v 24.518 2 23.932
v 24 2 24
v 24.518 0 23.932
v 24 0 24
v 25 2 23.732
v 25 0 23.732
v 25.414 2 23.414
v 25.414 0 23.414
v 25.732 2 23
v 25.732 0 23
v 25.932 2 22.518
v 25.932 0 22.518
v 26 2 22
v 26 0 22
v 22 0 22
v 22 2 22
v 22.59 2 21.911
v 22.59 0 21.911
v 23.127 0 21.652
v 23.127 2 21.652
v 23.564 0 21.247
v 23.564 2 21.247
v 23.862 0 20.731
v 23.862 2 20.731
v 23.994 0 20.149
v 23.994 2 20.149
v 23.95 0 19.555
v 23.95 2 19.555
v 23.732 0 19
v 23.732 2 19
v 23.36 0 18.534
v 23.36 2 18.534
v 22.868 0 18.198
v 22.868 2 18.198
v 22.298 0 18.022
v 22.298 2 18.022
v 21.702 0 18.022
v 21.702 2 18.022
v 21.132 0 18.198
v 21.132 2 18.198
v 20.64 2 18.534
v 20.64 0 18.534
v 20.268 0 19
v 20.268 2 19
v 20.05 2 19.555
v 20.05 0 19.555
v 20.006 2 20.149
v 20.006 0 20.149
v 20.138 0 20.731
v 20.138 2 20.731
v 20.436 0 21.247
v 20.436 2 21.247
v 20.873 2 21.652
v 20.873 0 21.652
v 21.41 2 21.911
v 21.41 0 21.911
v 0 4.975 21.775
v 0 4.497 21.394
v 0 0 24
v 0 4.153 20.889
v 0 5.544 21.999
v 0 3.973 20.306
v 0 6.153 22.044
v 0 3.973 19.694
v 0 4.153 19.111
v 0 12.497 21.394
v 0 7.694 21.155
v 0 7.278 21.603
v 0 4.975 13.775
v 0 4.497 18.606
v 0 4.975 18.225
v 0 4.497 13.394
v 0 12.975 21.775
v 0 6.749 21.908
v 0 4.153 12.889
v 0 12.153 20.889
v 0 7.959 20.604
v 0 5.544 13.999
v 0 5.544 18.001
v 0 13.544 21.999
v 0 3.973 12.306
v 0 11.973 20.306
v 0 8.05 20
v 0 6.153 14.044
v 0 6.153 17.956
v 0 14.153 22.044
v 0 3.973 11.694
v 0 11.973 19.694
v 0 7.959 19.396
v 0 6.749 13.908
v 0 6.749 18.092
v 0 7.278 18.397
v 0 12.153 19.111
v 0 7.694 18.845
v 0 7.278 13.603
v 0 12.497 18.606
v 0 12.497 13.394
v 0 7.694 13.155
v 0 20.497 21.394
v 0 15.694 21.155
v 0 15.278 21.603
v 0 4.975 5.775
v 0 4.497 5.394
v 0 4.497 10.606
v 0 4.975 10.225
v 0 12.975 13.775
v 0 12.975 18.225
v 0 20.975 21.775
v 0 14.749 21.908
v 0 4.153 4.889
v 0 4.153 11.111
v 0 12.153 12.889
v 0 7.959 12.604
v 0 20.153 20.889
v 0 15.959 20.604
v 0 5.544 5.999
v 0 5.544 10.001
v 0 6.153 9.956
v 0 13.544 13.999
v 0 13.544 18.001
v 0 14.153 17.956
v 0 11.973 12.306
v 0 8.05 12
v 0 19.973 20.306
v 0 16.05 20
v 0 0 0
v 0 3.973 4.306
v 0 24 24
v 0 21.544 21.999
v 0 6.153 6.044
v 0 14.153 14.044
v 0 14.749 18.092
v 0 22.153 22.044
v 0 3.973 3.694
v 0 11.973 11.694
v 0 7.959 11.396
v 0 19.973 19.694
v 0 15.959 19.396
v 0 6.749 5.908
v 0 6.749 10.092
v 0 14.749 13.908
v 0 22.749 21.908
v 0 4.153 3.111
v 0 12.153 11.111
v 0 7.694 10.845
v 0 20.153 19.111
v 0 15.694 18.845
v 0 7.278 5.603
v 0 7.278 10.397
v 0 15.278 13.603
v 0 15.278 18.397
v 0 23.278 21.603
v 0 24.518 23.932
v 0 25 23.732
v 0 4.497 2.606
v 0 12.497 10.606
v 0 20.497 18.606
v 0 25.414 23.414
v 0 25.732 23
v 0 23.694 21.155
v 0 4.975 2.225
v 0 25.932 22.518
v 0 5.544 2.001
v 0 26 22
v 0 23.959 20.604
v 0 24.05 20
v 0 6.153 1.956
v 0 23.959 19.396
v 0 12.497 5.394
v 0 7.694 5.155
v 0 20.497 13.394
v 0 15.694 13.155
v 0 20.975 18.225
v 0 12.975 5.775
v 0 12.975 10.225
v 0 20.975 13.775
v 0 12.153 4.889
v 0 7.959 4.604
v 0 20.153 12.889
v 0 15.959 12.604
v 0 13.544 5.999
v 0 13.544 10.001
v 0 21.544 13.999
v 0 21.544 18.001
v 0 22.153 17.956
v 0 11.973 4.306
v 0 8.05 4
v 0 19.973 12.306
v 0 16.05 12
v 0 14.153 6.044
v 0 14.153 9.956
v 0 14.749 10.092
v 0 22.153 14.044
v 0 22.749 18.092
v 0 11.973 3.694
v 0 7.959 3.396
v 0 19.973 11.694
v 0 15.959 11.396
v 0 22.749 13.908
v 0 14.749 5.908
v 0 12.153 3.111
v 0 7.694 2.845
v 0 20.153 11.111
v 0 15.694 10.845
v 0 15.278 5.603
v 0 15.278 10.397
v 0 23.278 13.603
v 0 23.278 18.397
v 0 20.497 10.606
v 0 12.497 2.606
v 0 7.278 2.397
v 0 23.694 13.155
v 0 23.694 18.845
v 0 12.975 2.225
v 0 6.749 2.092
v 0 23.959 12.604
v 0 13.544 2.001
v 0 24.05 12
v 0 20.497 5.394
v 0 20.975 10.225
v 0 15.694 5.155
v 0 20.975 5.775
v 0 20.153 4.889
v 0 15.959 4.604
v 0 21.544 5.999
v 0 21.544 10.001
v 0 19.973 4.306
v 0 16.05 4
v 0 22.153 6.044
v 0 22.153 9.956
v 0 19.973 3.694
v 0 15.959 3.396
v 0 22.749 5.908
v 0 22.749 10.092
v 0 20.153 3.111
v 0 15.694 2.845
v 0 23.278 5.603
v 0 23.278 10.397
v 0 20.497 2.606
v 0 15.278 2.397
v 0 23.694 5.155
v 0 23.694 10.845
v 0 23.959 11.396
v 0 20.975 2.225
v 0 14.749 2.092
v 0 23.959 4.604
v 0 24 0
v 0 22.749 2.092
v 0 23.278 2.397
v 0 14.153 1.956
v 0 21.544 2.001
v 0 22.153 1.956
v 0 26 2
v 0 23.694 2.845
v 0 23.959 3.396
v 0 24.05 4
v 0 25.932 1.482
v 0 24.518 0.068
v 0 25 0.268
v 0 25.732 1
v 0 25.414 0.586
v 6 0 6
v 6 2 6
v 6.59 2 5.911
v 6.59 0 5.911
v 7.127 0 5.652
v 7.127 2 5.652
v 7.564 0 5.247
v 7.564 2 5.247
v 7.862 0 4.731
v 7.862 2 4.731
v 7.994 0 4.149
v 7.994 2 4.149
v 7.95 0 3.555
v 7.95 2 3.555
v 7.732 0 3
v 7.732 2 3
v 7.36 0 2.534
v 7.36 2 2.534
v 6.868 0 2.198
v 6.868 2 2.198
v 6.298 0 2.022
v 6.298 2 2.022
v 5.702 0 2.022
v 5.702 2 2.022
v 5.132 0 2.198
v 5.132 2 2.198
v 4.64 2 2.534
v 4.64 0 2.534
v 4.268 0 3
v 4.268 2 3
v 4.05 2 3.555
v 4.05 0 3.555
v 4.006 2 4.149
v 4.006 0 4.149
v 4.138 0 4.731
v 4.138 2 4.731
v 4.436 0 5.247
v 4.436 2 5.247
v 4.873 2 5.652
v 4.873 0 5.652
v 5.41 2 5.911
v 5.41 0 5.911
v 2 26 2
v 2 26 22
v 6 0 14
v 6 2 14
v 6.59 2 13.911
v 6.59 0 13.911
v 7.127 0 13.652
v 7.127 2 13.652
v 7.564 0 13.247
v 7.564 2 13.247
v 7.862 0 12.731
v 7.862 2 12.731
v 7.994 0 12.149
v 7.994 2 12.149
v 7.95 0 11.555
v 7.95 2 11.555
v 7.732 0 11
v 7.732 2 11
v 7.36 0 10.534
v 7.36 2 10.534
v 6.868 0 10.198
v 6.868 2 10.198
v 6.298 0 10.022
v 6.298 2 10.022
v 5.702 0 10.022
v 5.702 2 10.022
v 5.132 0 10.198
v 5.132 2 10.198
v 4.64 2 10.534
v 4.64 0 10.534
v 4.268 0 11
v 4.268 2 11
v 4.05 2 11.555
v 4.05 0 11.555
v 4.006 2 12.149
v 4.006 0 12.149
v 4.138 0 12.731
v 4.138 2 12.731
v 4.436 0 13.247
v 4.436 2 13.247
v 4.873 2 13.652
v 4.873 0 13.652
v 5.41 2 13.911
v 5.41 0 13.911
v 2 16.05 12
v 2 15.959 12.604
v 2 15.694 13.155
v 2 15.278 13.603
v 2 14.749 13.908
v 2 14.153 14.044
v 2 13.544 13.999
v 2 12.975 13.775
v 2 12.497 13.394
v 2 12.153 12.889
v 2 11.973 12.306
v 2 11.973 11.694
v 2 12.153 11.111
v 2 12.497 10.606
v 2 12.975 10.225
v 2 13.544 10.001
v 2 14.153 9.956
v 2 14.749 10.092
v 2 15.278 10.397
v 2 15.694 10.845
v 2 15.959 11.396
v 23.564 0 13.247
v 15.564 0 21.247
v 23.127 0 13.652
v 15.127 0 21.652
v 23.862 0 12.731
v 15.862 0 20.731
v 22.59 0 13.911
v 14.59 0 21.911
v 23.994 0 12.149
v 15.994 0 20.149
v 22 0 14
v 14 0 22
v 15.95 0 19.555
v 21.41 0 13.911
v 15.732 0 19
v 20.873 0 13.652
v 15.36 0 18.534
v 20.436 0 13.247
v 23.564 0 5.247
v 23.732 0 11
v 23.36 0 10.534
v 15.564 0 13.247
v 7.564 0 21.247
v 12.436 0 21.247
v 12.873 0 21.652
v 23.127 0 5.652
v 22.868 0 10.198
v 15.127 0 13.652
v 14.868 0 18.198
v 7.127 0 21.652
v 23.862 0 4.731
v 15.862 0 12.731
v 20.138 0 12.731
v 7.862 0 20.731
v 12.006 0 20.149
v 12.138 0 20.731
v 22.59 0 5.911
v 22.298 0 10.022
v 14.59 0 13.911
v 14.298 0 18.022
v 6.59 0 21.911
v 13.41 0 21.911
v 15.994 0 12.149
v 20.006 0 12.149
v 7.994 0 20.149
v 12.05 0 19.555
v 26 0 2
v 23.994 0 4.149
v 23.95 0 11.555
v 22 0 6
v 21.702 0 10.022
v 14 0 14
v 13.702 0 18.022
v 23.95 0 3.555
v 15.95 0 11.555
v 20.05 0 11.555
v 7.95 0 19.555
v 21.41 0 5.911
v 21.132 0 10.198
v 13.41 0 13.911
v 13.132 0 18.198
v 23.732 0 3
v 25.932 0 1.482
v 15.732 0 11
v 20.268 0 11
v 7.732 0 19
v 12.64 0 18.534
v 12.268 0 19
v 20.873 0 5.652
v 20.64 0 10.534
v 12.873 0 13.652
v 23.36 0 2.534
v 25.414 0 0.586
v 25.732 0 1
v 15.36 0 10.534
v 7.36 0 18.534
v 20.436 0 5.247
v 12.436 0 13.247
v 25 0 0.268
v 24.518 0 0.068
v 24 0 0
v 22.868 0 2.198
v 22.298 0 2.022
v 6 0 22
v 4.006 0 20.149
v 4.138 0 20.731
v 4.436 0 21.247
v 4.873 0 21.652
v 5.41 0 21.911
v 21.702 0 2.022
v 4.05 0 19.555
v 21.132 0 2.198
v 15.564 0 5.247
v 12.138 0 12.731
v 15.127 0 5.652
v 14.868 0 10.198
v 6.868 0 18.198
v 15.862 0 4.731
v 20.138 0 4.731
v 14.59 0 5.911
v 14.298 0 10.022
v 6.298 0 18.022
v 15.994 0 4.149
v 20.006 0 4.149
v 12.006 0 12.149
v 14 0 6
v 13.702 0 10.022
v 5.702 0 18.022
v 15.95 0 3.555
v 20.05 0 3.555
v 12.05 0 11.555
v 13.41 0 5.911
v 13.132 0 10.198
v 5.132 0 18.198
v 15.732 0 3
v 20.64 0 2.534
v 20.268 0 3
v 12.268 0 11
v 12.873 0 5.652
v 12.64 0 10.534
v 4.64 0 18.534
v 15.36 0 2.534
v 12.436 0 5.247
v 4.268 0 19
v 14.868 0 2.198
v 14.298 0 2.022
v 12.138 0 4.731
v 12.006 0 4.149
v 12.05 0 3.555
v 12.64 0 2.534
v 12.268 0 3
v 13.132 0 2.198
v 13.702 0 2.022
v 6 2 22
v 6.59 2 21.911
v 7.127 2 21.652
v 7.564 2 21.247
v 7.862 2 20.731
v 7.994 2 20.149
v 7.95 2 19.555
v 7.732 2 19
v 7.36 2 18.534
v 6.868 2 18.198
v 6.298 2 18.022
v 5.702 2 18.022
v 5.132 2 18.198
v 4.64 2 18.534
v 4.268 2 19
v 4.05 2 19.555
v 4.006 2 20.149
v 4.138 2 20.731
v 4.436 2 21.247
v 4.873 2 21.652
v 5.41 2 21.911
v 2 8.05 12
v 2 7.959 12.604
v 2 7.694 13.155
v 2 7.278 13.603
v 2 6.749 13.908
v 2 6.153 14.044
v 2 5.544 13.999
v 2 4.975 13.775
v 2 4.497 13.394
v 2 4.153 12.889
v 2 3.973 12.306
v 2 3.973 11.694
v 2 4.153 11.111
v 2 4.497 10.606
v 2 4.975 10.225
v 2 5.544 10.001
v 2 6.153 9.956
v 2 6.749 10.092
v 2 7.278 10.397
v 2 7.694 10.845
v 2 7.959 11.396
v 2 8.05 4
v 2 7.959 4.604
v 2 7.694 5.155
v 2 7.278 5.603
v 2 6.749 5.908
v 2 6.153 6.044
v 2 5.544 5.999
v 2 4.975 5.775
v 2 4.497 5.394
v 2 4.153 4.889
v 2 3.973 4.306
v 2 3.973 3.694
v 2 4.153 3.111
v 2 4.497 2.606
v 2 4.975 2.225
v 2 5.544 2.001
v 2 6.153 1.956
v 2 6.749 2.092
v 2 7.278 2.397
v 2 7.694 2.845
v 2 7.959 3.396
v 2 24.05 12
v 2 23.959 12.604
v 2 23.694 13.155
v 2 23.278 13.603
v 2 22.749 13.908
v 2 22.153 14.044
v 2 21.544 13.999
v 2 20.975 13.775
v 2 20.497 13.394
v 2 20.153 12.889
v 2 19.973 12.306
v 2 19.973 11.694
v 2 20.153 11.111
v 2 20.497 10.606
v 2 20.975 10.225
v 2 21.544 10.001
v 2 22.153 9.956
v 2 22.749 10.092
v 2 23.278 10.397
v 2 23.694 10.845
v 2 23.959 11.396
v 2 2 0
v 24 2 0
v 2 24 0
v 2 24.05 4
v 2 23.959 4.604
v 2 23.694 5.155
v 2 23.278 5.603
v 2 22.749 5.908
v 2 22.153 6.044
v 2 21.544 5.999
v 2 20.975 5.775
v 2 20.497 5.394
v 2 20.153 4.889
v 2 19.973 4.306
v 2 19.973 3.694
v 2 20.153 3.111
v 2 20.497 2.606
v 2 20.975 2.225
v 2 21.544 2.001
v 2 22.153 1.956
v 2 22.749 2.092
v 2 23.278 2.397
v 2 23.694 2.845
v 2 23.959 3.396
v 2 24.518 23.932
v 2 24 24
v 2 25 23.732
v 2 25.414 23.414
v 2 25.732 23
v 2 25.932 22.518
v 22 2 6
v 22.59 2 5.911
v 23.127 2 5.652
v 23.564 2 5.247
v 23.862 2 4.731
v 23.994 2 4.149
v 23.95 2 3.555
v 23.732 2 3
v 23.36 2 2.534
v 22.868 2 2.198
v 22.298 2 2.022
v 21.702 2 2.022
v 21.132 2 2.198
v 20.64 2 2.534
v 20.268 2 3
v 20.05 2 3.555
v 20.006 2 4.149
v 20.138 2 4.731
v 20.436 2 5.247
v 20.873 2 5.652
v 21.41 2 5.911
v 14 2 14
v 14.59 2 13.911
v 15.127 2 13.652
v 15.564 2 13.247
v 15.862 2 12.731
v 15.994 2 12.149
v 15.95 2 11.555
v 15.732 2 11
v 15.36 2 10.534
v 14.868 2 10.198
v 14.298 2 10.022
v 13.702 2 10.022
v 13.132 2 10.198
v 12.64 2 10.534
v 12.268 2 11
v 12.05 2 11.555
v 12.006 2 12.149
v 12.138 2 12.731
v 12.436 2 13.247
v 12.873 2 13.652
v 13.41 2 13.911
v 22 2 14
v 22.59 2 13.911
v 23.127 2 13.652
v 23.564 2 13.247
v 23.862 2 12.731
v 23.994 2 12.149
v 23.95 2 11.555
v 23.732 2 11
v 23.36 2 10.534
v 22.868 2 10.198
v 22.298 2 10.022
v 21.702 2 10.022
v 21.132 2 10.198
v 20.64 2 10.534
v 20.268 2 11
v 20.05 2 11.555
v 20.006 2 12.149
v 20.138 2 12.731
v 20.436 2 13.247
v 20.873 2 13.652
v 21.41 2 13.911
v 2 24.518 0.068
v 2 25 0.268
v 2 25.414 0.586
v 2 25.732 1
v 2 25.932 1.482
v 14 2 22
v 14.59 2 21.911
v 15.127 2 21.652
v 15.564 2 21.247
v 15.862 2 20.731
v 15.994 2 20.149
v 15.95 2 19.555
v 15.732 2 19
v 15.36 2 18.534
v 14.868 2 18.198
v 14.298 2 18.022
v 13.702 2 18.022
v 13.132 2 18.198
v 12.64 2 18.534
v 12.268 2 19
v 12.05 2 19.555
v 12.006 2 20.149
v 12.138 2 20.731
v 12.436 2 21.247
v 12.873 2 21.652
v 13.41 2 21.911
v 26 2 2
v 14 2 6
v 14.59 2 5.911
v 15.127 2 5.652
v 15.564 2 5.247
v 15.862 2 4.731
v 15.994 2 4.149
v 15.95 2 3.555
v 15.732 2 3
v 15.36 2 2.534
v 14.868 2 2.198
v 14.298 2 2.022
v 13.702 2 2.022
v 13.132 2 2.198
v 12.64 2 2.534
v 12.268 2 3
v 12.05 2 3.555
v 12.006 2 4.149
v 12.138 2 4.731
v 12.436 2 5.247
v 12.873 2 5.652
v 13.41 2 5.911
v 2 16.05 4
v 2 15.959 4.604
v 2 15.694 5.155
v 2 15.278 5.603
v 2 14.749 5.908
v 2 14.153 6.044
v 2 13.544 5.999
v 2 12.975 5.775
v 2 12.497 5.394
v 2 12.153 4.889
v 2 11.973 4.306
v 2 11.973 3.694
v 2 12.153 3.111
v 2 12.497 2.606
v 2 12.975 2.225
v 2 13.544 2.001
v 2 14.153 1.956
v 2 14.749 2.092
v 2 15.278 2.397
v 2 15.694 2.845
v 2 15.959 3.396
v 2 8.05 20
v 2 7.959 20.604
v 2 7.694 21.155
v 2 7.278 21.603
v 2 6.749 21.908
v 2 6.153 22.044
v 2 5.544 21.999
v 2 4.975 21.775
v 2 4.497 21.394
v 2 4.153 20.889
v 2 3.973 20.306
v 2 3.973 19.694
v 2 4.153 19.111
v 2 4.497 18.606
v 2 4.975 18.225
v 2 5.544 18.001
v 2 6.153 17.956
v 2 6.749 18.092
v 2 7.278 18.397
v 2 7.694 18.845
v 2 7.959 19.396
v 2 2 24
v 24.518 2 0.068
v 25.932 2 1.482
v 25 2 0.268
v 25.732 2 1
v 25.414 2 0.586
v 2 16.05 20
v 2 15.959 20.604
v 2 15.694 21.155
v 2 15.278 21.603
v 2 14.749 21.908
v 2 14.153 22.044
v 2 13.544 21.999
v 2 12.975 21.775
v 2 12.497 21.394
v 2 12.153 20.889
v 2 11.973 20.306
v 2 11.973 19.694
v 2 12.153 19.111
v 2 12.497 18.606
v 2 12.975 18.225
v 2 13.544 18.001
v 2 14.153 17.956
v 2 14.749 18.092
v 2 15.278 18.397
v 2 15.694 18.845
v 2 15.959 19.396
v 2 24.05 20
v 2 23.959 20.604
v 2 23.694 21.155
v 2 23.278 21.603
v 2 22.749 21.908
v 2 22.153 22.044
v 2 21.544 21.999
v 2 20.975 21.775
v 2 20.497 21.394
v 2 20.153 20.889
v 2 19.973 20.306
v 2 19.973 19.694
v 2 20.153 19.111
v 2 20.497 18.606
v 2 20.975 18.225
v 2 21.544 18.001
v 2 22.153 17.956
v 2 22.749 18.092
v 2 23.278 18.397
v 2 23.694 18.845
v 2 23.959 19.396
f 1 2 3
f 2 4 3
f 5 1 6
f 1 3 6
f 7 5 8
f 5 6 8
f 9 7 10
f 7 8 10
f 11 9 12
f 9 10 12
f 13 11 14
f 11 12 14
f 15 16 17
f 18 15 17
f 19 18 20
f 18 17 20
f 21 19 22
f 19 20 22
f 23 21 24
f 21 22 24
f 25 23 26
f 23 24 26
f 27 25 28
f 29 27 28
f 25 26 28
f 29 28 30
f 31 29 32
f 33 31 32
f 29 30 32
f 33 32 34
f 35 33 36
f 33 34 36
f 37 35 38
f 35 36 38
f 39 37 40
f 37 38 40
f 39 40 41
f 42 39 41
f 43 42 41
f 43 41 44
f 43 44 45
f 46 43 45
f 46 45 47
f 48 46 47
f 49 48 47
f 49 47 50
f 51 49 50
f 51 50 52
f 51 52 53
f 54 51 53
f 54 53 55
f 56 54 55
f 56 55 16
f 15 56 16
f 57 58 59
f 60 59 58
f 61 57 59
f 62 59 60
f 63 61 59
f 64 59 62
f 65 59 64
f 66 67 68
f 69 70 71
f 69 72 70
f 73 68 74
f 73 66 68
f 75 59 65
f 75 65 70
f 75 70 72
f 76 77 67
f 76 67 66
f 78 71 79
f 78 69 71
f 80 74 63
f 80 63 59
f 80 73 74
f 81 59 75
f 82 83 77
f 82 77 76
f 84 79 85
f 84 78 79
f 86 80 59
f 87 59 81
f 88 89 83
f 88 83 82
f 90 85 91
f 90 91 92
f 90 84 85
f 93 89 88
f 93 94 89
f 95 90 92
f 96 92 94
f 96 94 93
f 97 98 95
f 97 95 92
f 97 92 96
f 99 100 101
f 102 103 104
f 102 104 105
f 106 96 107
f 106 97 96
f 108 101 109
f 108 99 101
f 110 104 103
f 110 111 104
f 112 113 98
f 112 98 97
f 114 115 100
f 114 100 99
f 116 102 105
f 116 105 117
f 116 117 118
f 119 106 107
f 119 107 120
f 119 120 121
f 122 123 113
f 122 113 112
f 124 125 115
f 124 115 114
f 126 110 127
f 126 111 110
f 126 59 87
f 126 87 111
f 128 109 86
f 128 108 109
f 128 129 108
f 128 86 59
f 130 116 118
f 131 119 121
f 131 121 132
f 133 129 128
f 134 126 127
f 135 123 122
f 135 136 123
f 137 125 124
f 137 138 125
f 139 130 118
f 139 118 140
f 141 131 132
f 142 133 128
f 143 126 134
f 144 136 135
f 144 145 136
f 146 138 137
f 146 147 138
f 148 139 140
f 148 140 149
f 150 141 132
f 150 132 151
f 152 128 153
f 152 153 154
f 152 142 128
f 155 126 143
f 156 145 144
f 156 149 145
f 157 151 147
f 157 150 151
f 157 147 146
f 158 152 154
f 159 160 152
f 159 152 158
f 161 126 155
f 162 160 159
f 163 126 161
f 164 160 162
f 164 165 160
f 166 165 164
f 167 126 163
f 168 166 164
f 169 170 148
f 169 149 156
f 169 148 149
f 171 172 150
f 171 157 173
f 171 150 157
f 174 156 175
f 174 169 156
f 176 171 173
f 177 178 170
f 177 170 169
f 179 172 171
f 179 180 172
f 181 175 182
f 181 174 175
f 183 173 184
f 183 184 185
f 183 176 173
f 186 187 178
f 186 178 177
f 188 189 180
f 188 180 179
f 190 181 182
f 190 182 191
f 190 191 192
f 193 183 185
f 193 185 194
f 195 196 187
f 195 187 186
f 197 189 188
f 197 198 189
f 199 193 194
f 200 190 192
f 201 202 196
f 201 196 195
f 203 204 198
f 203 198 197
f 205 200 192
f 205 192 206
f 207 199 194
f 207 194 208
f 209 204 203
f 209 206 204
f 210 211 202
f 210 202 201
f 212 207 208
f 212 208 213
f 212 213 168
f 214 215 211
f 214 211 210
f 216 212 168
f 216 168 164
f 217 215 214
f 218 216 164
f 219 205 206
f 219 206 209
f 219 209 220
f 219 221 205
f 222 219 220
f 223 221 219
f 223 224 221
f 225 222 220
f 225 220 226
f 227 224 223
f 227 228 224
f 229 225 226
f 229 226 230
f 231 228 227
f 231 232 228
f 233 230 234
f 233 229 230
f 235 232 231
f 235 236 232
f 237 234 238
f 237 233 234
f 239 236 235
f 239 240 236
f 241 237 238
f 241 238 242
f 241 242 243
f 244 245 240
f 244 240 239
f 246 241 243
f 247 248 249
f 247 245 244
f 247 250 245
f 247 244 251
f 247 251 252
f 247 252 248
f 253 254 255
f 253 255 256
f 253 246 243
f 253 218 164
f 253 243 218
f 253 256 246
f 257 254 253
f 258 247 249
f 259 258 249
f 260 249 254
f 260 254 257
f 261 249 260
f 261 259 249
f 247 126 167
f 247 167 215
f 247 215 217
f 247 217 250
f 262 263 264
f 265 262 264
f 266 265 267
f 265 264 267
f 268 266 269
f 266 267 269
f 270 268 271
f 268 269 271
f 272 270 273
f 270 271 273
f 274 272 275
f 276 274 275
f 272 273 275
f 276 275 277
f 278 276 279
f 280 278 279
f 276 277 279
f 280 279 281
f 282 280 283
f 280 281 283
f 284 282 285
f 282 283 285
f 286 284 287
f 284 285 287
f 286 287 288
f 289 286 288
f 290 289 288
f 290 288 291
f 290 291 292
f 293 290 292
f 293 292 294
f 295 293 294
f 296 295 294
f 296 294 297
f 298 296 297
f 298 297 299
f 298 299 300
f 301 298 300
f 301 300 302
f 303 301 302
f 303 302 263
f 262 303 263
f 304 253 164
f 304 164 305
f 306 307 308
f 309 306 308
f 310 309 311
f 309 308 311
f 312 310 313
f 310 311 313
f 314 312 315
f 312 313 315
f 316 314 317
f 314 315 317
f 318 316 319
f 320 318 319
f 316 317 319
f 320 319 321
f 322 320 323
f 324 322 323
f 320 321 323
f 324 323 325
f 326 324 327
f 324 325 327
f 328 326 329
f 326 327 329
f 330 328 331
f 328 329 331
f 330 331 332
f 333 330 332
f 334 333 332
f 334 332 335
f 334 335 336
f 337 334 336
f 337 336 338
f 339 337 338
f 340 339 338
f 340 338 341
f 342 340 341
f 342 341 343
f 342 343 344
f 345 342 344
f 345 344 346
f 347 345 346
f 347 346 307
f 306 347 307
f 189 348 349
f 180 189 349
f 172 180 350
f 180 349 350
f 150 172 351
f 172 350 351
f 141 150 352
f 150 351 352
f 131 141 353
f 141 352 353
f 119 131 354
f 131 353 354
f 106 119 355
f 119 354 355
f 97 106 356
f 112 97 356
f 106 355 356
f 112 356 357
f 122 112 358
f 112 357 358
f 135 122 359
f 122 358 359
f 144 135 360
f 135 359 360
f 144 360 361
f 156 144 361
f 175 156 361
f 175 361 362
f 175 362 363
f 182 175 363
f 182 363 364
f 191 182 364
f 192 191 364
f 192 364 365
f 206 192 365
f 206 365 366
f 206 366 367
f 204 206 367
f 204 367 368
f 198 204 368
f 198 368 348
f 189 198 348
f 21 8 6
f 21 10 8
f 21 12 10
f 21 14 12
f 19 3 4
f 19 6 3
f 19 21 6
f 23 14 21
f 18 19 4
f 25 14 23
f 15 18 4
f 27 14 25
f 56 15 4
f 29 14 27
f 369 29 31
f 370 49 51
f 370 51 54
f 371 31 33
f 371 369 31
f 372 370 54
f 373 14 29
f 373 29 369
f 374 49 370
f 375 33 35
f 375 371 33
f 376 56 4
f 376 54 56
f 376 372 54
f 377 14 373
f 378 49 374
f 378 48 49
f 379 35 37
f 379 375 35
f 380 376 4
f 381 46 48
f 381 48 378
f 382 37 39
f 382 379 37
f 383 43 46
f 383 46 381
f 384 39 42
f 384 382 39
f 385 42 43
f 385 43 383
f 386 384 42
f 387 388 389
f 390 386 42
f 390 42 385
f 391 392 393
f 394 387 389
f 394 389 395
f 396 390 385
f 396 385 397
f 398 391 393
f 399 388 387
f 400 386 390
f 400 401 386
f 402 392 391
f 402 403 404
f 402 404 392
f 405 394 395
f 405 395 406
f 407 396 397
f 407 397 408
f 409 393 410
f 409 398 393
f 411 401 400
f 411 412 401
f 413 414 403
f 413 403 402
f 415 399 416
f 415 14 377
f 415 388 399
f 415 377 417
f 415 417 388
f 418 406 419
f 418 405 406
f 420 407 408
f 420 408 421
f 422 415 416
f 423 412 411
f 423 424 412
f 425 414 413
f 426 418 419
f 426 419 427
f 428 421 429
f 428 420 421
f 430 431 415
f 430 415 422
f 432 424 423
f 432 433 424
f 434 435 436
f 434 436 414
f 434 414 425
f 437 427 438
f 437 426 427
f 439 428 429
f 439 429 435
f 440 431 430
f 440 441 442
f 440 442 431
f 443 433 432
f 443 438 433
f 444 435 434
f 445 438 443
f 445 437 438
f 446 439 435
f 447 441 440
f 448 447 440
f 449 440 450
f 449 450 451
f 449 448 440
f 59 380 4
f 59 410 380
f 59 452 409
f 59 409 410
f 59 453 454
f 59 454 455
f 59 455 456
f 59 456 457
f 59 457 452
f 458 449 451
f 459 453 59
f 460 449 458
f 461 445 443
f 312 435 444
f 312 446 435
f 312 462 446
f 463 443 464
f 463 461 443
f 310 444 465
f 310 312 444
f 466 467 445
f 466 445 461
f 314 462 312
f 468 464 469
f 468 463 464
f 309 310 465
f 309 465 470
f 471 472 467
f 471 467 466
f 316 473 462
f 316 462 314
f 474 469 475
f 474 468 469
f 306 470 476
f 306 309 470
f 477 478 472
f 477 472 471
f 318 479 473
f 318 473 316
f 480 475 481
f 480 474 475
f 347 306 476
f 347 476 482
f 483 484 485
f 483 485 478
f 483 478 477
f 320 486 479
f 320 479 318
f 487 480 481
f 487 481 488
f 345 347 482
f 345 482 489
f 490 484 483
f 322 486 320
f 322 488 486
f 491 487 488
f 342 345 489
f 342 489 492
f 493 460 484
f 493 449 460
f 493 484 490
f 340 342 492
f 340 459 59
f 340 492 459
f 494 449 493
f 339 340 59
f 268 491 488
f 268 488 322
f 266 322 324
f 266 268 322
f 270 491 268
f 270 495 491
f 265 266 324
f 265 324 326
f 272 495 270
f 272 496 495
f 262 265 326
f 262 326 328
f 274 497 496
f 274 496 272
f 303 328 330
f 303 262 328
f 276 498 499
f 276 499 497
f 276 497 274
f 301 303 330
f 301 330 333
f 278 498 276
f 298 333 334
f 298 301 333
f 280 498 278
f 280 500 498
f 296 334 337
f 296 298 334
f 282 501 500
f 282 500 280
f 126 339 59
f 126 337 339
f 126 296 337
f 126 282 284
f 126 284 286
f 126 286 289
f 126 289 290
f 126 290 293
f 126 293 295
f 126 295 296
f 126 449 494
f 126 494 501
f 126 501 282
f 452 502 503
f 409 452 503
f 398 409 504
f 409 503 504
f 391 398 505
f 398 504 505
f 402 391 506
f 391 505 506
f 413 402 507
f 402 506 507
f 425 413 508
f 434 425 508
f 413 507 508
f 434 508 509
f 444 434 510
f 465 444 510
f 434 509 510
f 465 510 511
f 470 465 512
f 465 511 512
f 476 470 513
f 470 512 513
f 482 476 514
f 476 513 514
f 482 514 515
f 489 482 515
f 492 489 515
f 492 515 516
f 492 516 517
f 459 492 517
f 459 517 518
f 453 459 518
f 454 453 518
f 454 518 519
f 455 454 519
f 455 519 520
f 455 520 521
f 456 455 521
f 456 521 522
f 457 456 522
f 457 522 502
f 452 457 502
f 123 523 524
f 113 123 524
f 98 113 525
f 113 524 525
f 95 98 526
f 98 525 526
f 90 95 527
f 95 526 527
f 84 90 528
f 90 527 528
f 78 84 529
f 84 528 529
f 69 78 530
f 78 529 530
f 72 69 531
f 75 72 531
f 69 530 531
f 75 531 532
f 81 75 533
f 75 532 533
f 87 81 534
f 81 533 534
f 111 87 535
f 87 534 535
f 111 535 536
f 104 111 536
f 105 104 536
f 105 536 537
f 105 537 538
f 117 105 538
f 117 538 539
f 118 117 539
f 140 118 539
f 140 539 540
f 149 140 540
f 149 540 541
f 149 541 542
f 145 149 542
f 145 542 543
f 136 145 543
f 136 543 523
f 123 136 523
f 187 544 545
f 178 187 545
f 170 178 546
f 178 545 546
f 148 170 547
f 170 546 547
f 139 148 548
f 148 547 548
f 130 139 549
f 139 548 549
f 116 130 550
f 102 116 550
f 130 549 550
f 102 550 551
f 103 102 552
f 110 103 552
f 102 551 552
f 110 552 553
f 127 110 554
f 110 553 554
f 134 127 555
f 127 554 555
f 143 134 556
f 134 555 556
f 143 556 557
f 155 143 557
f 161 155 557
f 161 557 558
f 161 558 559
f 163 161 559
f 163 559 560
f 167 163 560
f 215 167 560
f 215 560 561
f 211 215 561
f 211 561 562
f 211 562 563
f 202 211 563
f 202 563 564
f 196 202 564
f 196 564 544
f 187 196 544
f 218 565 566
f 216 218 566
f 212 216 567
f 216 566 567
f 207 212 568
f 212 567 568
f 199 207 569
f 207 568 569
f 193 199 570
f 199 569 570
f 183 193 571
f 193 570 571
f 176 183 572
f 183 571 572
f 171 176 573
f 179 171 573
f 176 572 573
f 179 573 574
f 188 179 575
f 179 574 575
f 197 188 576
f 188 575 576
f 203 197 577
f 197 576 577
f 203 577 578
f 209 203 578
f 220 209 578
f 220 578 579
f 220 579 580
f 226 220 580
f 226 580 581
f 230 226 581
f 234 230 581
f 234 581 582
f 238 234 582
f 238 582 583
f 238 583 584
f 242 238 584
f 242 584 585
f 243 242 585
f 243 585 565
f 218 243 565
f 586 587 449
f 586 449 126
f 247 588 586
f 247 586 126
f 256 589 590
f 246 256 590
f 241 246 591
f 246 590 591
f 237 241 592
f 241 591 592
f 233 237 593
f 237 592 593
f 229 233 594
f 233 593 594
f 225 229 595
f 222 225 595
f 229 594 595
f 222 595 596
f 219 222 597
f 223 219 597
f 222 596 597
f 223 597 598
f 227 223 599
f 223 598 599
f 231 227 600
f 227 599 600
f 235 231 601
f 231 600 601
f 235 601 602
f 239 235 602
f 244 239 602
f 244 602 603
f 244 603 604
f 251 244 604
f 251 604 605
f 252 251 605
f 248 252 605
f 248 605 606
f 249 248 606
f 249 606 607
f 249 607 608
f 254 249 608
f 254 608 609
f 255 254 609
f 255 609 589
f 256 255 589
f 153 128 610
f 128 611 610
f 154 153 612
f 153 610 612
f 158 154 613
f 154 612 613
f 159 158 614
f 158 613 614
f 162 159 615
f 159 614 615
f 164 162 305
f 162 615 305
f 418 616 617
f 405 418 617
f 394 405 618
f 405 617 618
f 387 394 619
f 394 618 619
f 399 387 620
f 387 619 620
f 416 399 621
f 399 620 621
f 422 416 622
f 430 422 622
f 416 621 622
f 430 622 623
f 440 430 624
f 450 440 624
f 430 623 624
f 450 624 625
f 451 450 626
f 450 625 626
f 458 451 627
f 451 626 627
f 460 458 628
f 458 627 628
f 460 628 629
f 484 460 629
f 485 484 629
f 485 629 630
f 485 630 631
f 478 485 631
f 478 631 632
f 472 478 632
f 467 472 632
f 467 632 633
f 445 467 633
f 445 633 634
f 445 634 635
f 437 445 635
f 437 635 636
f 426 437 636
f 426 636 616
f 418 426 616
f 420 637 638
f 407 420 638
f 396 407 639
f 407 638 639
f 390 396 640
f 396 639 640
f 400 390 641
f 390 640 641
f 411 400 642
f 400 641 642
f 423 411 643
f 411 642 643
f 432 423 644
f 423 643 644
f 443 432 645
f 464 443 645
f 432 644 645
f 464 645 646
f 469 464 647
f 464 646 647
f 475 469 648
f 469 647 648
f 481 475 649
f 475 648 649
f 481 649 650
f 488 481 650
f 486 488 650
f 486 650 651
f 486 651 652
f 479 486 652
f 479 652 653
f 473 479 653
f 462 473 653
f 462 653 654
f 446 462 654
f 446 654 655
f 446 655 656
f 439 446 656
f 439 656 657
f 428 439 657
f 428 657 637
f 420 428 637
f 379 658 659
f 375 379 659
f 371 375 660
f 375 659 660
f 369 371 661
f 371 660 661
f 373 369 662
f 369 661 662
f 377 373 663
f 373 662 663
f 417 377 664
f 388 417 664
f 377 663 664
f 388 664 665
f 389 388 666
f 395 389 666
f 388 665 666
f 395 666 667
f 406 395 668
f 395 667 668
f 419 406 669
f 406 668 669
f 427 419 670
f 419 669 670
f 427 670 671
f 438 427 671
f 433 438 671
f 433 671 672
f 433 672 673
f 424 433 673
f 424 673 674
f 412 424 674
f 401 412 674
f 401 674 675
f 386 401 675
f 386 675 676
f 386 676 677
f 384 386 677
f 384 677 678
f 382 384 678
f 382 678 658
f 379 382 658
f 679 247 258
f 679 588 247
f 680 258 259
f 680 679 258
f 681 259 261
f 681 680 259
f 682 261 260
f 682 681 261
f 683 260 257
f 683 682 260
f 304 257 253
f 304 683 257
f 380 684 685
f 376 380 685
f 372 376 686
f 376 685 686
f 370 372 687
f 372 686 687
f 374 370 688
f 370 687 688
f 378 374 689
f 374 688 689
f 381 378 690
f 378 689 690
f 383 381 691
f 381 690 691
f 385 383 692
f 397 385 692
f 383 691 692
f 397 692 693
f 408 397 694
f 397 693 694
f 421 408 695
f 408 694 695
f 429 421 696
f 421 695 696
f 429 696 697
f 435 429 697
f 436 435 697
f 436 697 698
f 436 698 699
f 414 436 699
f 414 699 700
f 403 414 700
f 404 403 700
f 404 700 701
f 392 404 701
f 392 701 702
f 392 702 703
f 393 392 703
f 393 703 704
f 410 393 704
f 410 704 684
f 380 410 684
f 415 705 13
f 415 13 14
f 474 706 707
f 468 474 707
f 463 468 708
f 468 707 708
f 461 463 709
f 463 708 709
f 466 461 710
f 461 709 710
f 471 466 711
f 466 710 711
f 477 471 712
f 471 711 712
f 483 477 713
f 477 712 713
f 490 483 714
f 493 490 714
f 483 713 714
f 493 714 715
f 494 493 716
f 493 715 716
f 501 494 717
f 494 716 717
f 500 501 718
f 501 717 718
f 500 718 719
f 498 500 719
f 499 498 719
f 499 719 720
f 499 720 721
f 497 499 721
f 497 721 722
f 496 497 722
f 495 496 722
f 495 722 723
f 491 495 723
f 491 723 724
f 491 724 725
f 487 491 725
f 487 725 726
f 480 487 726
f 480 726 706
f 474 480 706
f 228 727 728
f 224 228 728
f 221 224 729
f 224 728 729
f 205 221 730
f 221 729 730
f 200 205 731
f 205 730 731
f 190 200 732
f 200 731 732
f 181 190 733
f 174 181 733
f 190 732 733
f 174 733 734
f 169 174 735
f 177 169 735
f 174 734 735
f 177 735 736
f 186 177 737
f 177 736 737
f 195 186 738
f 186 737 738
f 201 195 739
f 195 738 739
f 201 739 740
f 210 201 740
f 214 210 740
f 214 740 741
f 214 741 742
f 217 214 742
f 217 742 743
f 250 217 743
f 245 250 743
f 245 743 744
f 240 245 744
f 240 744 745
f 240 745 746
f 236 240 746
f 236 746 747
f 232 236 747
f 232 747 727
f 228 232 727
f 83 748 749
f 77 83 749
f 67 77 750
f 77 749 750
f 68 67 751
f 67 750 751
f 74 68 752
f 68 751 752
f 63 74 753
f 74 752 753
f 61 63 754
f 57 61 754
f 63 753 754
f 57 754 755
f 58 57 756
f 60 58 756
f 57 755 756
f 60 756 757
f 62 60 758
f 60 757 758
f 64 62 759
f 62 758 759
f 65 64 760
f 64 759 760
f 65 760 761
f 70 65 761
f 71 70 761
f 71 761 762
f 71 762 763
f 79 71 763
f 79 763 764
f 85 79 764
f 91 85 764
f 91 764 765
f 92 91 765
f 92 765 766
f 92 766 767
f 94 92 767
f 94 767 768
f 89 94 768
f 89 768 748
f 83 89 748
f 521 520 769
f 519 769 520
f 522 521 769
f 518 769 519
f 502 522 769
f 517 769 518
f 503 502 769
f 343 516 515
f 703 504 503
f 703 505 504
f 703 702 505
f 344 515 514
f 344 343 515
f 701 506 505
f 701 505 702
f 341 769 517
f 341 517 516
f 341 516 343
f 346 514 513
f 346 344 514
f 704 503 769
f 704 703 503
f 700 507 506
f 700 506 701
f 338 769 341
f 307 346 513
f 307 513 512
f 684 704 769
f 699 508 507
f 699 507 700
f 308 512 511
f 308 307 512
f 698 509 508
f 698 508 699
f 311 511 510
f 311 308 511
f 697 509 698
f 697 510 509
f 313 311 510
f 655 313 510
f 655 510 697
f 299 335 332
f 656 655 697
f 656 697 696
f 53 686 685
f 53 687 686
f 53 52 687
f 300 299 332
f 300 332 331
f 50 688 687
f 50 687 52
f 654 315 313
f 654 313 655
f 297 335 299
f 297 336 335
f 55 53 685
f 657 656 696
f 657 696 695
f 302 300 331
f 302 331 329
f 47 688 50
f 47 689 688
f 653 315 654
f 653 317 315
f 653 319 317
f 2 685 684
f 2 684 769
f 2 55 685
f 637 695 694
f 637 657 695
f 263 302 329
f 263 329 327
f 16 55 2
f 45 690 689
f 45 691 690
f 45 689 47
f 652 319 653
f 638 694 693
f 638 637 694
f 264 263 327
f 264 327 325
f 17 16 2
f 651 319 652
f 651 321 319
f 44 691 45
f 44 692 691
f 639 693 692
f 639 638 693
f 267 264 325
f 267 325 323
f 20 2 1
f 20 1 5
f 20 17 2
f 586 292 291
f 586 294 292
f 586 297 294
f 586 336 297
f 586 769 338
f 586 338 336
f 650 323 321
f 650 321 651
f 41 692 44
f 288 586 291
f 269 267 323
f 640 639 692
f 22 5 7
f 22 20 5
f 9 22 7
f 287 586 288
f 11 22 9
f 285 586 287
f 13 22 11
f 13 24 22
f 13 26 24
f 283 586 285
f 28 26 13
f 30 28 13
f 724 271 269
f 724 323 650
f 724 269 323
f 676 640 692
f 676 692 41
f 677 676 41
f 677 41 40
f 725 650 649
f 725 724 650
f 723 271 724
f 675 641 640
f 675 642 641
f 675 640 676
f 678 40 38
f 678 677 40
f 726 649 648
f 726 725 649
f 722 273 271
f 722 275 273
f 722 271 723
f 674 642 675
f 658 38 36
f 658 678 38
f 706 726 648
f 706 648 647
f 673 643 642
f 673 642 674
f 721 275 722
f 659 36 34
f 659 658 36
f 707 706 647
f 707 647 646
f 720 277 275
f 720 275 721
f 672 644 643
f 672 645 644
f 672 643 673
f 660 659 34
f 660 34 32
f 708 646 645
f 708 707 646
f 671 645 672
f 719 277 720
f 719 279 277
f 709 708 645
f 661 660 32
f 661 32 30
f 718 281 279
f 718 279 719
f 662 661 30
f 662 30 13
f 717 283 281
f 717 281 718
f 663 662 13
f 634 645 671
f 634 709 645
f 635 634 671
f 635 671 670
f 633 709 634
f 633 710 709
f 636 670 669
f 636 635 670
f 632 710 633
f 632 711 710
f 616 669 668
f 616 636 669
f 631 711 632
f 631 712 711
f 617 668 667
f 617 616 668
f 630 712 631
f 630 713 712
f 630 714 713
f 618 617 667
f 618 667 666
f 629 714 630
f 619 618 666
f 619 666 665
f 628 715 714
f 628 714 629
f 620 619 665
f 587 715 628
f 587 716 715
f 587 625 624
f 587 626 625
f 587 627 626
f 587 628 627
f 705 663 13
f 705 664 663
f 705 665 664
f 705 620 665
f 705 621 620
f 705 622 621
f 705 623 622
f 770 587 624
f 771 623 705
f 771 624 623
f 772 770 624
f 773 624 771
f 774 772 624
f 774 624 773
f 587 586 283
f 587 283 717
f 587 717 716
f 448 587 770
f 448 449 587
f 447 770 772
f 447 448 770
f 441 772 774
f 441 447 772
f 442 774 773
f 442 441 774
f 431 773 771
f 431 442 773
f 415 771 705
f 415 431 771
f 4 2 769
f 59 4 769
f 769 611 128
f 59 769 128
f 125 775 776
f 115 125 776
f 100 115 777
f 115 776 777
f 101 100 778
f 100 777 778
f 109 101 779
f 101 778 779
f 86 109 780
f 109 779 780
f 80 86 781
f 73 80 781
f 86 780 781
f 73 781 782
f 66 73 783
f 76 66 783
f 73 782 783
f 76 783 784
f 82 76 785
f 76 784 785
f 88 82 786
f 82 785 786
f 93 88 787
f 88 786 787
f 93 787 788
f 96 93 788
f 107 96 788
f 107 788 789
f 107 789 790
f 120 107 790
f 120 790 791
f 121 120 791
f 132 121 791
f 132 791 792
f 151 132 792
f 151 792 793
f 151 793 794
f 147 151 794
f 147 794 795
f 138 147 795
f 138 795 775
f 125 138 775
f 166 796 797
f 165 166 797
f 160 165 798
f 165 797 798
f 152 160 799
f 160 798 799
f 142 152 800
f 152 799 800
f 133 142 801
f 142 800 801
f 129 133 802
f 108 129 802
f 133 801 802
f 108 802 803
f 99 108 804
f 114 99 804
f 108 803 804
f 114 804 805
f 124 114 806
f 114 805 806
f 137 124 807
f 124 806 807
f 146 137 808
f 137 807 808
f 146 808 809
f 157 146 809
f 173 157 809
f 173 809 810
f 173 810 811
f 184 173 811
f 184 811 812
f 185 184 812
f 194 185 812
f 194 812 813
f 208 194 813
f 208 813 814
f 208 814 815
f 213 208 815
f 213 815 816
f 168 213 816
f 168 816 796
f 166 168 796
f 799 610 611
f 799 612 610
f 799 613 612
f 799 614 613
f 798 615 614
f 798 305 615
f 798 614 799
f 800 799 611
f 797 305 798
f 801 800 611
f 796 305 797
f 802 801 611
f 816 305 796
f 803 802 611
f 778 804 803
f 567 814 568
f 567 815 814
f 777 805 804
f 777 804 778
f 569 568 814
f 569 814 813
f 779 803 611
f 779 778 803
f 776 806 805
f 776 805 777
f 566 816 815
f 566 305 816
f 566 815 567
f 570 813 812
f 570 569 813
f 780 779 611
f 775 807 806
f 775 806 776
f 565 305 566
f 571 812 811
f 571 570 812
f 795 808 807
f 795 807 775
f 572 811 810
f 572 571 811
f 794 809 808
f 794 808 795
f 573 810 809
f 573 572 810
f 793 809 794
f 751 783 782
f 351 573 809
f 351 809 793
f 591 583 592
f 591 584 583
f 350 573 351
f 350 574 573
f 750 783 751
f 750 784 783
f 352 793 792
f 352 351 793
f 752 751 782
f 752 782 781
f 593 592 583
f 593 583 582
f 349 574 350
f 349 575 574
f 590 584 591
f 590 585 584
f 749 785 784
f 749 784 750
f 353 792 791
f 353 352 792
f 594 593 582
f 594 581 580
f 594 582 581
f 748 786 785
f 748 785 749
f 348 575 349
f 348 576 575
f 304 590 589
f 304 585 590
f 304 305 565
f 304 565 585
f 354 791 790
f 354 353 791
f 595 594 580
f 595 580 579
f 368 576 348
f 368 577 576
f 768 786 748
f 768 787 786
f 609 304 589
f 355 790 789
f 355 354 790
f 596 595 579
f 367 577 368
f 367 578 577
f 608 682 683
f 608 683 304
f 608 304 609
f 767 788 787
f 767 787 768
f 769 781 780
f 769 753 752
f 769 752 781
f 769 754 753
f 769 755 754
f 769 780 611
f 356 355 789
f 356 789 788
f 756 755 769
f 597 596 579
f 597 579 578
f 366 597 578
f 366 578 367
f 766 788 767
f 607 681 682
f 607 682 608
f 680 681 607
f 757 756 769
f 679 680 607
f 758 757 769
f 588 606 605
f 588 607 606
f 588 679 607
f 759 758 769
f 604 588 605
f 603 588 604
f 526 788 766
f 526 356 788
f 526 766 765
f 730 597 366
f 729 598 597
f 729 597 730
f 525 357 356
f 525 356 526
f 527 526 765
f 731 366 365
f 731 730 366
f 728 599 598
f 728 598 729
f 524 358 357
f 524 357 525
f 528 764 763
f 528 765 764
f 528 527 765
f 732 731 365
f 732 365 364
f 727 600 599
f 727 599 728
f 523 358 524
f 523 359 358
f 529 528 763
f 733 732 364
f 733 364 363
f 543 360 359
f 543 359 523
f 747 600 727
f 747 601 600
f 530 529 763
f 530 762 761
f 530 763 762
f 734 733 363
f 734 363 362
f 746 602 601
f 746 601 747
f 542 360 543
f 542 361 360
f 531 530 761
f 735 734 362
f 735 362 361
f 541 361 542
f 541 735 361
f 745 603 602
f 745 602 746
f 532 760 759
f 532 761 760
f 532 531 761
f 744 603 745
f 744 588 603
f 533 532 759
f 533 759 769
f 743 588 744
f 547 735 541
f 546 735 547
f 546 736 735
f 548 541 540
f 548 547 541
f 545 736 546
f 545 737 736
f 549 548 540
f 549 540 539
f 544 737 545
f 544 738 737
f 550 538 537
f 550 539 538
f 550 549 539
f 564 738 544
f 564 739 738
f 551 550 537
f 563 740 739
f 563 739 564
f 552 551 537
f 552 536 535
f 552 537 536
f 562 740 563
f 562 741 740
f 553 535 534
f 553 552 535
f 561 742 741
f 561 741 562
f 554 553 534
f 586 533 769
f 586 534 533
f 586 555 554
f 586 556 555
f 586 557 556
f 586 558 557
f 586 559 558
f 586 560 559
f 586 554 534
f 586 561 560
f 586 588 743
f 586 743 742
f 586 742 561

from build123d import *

# Parameters (mm, degrees)
BOSS_EXTRUDE1_DEPTH  = 24
SKETCH2_R            = 2.05
CUT_EXTRUDE1_DEPTH   = 43.755116653
LPATTERN1_COUNT      = 3
LPATTERN1_PITCH      = 8
LPATTERN1_COUNT_DIR2 = 3
LPATTERN1_PITCH_DIR2 = 8
SKETCH3_R            = 2
CUT_EXTRUDE2_DEPTH   = 43.755116653
LPATTERN2_COUNT      = 3
LPATTERN2_PITCH      = 8
LPATTERN2_COUNT_DIR2 = 3
LPATTERN2_PITCH_DIR2 = 8
FILLET1_R            = 2


with BuildPart() as part:
    # Sketch1 → Boss-Extrude1 (new body)
    with BuildSketch(Plane.XY):
        Polygon((0, 0), (0, 26), (2, 26), (2, 2), (26, 2), (26, 0), align=None)
    extrude(amount=BOSS_EXTRUDE1_DEPTH)

    # Sketch2 → Cut-Extrude1 (cut, through all)
    with BuildSketch(Plane(origin=(2, 0, 0), x_dir=(0, 0, -1), z_dir=(1, 0, 0))):
        with Locations(Location((-20, 22, 0), (0, 0, 90))):
            Circle(SKETCH2_R)
    cut_extrude1 = extrude(amount=-CUT_EXTRUDE1_DEPTH, mode=Mode.SUBTRACT)

    # LPattern1: Cut-Extrude1 3 × 3
    with Locations(*[(0, -j * LPATTERN1_PITCH_DIR2, -i * LPATTERN1_PITCH) for i in range(LPATTERN1_COUNT) for j in range(LPATTERN1_COUNT_DIR2) if (i, j) != (0, 0)]):
        add(cut_extrude1, mode=Mode.SUBTRACT)

    # Sketch3 → Cut-Extrude2 (cut, through all)
    with BuildSketch(Plane(origin=(0, 2, 0), x_dir=(1, 0, 0), z_dir=(0, 1, 0))):
        with Locations(Location((22, -4, 0), (0, 0, 270))):
            Circle(SKETCH3_R)
    cut_extrude2 = extrude(amount=-CUT_EXTRUDE2_DEPTH, mode=Mode.SUBTRACT)

    # LPattern2: Cut-Extrude2 3 × 3
    with Locations(*[(-j * LPATTERN2_PITCH_DIR2, 0, i * LPATTERN2_PITCH) for i in range(LPATTERN2_COUNT) for j in range(LPATTERN2_COUNT_DIR2) if (i, j) != (0, 0)]):
        add(cut_extrude2, mode=Mode.SUBTRACT)

    # Fillet1
    fillet1_edges = [part.edges().sort_by_distance(p)[0] for p in [
        (1, 26, 24),
        (1, 26, 0),
        (26, 1, 24),
        (26, 1, 0),
    ]]
    fillet(fillet1_edges, radius=FILLET1_R)


solid = part.part
